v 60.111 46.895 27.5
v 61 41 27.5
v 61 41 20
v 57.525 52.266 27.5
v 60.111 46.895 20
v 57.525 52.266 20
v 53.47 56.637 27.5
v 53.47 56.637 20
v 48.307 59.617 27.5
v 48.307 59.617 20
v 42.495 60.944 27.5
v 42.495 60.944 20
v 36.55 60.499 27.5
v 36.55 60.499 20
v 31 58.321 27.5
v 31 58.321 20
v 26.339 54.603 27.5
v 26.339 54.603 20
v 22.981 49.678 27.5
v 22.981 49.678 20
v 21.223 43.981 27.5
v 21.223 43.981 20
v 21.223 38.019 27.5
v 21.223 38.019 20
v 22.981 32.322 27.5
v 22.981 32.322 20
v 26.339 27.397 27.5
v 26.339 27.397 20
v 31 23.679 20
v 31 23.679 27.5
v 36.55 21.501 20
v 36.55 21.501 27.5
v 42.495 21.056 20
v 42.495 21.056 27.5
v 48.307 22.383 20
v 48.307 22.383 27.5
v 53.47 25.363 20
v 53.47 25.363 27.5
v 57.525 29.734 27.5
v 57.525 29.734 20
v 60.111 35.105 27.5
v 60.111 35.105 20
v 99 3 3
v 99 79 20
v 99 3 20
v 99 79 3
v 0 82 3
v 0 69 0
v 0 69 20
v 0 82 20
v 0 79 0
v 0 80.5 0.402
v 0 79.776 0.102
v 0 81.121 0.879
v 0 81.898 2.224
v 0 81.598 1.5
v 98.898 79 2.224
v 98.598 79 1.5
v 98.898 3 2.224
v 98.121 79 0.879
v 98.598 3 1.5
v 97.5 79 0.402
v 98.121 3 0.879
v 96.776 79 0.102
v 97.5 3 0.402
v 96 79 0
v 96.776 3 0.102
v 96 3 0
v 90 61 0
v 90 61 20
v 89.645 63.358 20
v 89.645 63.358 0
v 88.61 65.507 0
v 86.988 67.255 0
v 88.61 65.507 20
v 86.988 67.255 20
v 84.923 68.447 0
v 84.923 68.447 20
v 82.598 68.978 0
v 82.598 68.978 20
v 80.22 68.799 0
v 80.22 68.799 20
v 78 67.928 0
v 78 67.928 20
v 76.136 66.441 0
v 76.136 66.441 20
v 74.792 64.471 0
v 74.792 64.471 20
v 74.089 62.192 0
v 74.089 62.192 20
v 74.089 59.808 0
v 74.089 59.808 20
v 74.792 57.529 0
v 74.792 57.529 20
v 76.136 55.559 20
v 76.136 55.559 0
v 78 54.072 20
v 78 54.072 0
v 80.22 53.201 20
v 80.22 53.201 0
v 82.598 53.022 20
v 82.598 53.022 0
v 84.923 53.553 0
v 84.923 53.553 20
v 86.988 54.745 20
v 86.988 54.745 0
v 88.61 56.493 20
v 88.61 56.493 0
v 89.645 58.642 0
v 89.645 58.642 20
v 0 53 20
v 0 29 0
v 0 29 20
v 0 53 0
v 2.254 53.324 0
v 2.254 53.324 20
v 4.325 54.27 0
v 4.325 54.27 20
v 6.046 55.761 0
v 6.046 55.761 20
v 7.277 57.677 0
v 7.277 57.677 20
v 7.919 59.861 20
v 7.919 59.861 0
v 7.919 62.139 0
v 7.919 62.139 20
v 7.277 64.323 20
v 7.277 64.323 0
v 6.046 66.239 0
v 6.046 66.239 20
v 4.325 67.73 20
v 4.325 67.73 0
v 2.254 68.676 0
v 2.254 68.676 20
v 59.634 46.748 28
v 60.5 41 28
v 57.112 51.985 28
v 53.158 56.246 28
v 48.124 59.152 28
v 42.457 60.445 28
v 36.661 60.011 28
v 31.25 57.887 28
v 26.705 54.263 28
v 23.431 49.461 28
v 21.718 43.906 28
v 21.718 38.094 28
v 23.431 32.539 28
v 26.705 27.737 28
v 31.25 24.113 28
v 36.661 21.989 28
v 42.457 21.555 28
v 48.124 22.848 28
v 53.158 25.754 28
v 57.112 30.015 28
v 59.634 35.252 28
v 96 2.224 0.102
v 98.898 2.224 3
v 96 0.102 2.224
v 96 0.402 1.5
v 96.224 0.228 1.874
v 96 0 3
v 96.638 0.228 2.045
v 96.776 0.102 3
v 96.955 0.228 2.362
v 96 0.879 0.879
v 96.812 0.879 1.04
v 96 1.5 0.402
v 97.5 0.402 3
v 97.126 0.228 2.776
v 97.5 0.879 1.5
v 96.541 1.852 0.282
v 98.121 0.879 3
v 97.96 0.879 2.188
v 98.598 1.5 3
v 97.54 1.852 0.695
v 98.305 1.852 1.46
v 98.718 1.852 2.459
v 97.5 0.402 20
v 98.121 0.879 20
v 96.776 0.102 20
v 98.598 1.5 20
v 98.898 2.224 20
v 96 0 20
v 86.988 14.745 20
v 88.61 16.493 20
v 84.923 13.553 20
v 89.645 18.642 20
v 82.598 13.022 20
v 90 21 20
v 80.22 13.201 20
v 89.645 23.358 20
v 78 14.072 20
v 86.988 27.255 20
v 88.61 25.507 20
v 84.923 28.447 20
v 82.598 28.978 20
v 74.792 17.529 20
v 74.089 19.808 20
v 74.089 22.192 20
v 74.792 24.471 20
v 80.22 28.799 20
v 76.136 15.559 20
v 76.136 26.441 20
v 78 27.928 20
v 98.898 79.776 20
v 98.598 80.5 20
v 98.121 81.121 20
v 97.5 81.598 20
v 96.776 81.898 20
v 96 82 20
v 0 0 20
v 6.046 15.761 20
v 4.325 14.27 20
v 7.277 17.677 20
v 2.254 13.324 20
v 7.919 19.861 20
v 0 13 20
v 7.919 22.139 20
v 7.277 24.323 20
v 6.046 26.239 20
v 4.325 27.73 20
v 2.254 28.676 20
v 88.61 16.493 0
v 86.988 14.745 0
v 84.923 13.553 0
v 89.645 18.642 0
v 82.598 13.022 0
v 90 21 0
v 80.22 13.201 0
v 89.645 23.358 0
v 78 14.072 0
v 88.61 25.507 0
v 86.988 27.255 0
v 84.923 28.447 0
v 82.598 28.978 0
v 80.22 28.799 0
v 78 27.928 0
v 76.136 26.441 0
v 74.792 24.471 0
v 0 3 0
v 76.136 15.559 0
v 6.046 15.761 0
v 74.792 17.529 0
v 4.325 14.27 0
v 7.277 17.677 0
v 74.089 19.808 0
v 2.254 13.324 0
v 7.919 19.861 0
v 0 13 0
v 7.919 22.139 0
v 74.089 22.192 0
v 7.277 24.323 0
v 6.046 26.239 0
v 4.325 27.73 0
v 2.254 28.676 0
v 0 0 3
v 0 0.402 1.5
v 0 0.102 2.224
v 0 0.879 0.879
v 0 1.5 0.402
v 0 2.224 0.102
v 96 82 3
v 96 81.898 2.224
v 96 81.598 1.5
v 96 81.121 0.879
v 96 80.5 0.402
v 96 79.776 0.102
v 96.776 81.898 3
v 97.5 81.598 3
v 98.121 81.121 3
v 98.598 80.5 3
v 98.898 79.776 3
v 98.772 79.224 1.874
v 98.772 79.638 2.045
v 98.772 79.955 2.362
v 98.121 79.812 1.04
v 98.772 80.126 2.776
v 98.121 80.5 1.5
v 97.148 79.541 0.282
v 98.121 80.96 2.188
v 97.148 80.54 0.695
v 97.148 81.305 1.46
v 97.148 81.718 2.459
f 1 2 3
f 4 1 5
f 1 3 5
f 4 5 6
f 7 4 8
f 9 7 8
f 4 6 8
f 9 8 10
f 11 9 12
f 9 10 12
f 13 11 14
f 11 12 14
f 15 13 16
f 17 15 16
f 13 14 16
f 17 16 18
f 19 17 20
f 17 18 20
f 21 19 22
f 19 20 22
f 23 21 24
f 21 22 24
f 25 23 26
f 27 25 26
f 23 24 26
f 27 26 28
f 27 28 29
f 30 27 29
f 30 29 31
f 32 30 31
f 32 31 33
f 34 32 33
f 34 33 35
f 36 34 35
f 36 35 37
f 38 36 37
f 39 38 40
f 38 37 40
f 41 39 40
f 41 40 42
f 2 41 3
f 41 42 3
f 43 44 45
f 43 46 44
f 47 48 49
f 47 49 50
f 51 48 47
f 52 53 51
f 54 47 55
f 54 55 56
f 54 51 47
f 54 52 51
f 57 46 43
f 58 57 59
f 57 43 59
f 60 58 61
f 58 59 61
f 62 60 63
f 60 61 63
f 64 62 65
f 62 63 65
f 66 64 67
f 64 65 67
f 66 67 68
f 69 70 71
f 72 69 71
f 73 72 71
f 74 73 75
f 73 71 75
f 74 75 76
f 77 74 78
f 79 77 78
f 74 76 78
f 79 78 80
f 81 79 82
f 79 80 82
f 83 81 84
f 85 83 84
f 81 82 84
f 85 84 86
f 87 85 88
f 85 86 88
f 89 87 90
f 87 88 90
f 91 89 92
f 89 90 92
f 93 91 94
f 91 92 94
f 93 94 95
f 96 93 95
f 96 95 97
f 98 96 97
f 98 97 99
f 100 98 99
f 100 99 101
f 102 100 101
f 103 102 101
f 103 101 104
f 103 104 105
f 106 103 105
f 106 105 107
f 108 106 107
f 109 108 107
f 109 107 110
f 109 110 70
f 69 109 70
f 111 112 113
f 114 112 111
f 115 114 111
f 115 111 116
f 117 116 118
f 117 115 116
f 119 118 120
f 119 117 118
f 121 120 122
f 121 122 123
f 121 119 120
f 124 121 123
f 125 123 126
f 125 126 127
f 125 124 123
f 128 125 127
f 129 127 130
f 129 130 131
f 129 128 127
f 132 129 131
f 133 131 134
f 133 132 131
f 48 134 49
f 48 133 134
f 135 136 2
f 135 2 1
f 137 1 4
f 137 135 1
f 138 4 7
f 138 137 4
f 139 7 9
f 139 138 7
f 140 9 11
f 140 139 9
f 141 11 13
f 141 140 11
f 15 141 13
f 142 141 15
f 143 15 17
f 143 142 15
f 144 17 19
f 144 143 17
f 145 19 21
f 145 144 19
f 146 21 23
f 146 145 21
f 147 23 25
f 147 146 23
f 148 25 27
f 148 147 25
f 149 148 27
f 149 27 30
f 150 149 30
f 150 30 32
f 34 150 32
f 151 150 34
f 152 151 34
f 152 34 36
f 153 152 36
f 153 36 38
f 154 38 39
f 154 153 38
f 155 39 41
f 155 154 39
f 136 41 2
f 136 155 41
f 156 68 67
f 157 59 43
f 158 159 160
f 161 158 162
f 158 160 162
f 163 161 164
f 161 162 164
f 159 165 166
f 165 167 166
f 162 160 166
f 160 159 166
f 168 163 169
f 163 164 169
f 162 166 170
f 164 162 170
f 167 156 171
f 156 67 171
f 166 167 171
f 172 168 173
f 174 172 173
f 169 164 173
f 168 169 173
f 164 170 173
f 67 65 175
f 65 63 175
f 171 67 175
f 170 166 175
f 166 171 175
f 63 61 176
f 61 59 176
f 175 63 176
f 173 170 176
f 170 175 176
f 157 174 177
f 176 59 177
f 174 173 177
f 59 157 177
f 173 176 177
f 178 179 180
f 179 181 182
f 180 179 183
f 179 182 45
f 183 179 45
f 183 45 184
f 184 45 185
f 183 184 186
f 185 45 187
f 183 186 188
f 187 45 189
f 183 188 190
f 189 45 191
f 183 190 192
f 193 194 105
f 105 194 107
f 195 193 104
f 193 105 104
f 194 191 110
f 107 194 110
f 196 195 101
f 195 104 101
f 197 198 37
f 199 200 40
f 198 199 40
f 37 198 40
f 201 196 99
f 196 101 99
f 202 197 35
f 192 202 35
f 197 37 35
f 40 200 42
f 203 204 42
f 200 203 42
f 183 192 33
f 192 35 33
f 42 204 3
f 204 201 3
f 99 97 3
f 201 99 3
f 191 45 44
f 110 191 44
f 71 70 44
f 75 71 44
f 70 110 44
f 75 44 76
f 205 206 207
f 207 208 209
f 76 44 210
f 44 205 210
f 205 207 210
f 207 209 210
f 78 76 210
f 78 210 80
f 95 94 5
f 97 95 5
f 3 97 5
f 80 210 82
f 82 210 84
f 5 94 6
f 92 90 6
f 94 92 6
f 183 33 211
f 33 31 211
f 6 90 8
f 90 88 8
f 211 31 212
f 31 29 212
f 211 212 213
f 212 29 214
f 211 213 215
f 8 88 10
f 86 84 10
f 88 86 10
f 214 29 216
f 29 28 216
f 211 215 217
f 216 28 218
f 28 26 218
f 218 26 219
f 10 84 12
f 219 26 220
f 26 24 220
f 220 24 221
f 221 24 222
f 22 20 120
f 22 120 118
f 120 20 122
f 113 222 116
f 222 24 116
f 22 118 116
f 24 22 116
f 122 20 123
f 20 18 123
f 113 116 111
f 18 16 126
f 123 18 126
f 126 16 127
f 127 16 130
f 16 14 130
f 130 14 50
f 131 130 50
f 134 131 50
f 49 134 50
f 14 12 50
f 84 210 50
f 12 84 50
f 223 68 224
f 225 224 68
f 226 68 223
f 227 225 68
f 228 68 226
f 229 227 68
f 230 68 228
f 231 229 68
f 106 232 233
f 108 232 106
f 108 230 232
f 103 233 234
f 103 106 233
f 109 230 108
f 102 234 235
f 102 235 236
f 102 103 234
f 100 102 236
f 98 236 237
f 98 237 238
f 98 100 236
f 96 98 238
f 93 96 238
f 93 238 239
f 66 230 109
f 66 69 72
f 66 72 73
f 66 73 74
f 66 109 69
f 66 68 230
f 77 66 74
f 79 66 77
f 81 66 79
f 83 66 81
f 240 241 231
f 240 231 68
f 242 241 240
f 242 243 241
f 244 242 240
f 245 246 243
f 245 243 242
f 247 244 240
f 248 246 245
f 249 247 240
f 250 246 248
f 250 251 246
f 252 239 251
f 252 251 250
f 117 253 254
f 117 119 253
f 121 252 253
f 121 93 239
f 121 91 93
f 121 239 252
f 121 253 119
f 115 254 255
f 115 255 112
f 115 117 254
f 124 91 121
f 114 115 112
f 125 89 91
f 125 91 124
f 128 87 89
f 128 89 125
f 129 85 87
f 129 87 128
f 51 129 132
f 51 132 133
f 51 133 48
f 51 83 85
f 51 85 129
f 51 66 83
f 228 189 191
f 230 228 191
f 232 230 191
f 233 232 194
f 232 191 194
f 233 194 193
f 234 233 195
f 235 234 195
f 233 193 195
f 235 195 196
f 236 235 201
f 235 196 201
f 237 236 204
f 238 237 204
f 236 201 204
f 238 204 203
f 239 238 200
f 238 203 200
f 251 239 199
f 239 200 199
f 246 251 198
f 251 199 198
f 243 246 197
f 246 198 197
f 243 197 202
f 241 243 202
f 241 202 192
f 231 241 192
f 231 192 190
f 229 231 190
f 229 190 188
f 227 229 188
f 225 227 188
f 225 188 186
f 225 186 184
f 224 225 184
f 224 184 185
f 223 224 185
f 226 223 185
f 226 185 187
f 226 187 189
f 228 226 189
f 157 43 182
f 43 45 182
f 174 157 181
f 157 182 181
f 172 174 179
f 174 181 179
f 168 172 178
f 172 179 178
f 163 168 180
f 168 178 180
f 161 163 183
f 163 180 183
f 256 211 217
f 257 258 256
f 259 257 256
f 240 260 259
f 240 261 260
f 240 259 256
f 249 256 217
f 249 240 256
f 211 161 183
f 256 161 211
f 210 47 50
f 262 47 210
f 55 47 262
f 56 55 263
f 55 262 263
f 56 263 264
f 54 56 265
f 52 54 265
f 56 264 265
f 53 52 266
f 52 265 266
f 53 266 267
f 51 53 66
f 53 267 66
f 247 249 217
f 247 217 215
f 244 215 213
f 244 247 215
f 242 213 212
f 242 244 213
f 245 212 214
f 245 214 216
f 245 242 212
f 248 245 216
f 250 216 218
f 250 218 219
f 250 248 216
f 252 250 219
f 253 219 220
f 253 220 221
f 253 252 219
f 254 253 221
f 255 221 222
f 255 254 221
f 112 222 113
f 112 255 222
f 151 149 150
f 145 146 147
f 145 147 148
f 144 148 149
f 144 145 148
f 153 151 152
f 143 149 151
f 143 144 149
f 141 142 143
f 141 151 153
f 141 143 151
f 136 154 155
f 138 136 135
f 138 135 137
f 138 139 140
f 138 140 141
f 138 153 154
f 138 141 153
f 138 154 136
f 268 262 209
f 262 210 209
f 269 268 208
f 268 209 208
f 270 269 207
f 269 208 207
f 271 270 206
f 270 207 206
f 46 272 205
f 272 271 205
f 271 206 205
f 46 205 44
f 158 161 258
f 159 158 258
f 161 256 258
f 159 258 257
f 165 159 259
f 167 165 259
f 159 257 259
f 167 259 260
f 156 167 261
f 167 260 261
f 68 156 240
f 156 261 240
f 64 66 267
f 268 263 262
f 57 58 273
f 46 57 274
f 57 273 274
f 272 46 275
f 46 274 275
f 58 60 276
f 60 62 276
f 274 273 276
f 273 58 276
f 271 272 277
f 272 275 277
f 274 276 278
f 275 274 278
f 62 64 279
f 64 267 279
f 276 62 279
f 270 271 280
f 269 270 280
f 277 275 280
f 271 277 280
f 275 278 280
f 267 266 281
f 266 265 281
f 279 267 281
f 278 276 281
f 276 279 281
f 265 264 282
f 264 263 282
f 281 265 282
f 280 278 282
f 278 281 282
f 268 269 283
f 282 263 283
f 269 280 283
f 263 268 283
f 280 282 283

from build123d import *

# Parameters (mm, degrees)
BOSS_EXTRUDE1_DEPTH = 20
SKETCH2_R           = 8
CUT_EXTRUDE1_DEPTH  = 21
LPATTERN1_COUNT     = 2
LPATTERN1_PITCH     = 40
SKETCH3_R           = 20
BOSS_EXTRUDE2_DEPTH = 8
CHAMFER1_SIZE       = 0.5
FILLET1_R           = 3


with BuildPart() as part:
    # Sketch1 → Boss-Extrude1 (new body)
    with BuildSketch(Plane.XY):
        with BuildLine():
            Line((0, 69), (0, 82))
            Line((0, 82), (99, 82))
            Line((99, 82), (99, 0))
            Line((99, 0), (0, 0))
            Line((0, 0), (0, 13))
            ThreePointArc((0, 13), (8, 21), (0, 29))
            Line((0, 29), (0, 53))
            ThreePointArc((0, 53), (8, 61), (0, 69))
        make_face()
    extrude(amount=BOSS_EXTRUDE1_DEPTH)

    # Sketch2 → Cut-Extrude1 (cut, through all)
    with BuildSketch(Plane.XY.offset(20)):
        with Locations((82, 21)):
            Circle(SKETCH2_R)
    cut_extrude1 = extrude(amount=-CUT_EXTRUDE1_DEPTH, mode=Mode.SUBTRACT)

    # LPattern1: Cut-Extrude1 ×2
    with Locations(*[(0, i * LPATTERN1_PITCH, 0) for i in range(1, LPATTERN1_COUNT)]):
        add(cut_extrude1, mode=Mode.SUBTRACT)

    # Sketch3 → Boss-Extrude2 (add)
    with BuildSketch(Plane.XY.offset(20)):
        with Locations((41, 41)):
            Circle(SKETCH3_R)
    extrude(amount=BOSS_EXTRUDE2_DEPTH)

    # Chamfer1
    chamfer1_edges = [part.edges().sort_by_distance(p)[0] for p in [
        (21, 41, 28),
    ]]
    chamfer(chamfer1_edges, length=CHAMFER1_SIZE)

    # Fillet1
    fillet1_edges = [part.edges().sort_by_distance(p)[0] for p in [
        (49.5, 82, 0),
        (99, 41, 0),
        (49.5, 0, 0),
        (99, 82, 10),
        (99, 0, 10),
    ]]
    fillet(fillet1_edges, radius=FILLET1_R)


solid = part.part
